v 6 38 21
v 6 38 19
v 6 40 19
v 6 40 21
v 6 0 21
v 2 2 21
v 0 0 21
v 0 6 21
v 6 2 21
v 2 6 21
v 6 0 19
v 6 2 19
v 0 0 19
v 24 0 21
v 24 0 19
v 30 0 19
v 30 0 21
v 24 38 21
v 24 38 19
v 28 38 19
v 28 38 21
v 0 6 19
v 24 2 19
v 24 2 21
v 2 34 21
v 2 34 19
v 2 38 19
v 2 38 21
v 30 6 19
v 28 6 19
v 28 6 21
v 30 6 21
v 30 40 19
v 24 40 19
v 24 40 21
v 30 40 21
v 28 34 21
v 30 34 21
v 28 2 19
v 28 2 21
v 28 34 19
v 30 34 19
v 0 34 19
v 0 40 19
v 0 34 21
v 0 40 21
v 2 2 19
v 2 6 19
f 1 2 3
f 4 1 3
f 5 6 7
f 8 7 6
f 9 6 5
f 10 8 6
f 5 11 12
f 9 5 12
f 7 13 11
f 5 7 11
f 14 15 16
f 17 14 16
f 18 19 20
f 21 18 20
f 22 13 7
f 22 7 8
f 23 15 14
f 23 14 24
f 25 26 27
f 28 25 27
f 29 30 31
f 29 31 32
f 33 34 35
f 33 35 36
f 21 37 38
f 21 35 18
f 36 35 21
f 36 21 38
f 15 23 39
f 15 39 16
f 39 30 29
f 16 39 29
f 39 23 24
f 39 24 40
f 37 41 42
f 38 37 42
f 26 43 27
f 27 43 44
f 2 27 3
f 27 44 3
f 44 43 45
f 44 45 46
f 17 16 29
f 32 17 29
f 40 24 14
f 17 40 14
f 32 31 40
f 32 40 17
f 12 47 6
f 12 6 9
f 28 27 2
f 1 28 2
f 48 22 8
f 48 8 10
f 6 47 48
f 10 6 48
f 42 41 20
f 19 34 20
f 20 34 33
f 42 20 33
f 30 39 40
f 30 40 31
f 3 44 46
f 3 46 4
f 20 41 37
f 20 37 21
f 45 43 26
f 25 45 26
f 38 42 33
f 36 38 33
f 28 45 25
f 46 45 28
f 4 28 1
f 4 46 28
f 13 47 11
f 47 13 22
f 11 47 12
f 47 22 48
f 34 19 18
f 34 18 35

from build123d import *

# Parameters (mm, degrees)
BOX044_W     = 6
BOX044_H     = 2
BOX044_DEPTH = 2
BOX045_W     = 6
BOX045_H     = 2
BOX045_DEPTH = 2
BOX046_W     = 6
BOX046_H     = 2
BOX046_DEPTH = 2
BOX048_W     = 6
BOX048_H     = 2
BOX048_DEPTH = 2
BOX049_W     = 2
BOX049_H     = 6
BOX049_DEPTH = 2
BOX050_W     = 2
BOX050_H     = 6
BOX050_DEPTH = 2
BOX051_W     = 2
BOX051_H     = 6
BOX051_DEPTH = 2
BOX043_W     = 2
BOX043_H     = 6
BOX043_DEPTH = 2


with BuildPart() as cube001:
    # Box044 → Box044 (new body)
    with BuildSketch(Plane.XY.offset(19)):
        with Locations((3, 1)):
            Rectangle(BOX044_W, BOX044_H)
    extrude(amount=BOX044_DEPTH)


with BuildPart() as cube002:
    # Box045 → Box045 (new body)
    with BuildSketch(Plane(origin=(24, 0, 19), x_dir=(1, 0, 0), z_dir=(0, 0, 1))):
        with Locations((3, 1)):
            Rectangle(BOX045_W, BOX045_H)
    extrude(amount=BOX045_DEPTH)


with BuildPart() as cube003:
    # Box046 → Box046 (new body)
    with BuildSketch(Plane(origin=(0, 38, 19), x_dir=(1, 0, 0), z_dir=(0, 0, 1))):
        with Locations((3, 1)):
            Rectangle(BOX046_W, BOX046_H)
    extrude(amount=BOX046_DEPTH)


with BuildPart() as cube005:
    # Box048 → Box048 (new body)
    with BuildSketch(Plane(origin=(24, 38, 19), x_dir=(1, 0, 0), z_dir=(0, 0, 1))):
        with Locations((3, 1)):
            Rectangle(BOX048_W, BOX048_H)
    extrude(amount=BOX048_DEPTH)


with BuildPart() as cube006:
    # Box049 → Box049 (new body)
    with BuildSketch(Plane(origin=(28, 0, 19), x_dir=(1, 0, 0), z_dir=(0, 0, 1))):
        with Locations((1, 3)):
            Rectangle(BOX049_W, BOX049_H)
    extrude(amount=BOX049_DEPTH)


with BuildPart() as cube007:
    # Box050 → Box050 (new body)
    with BuildSketch(Plane(origin=(0, 34, 19), x_dir=(1, 0, 0), z_dir=(0, 0, 1))):
        with Locations((1, 3)):
            Rectangle(BOX050_W, BOX050_H)
    extrude(amount=BOX050_DEPTH)


with BuildPart() as cube008:
    # Box051 → Box051 (new body)
    with BuildSketch(Plane(origin=(28, 34, 19), x_dir=(1, 0, 0), z_dir=(0, 0, 1))):
        with Locations((1, 3)):
            Rectangle(BOX051_W, BOX051_H)
    extrude(amount=BOX051_DEPTH)


with BuildPart() as support:
    # Box043 → Box043 (new body)
    with BuildSketch(Plane.XY.offset(19)):
        with Locations((1, 3)):
            Rectangle(BOX043_W, BOX043_H)
    extrude(amount=BOX043_DEPTH)

    # Fusion012: union Cube001, Cube002, Cube003, Cube005, Cube006, Cube007, Cube008
    add(cube001.part)
    add(cube002.part)
    add(cube003.part)
    add(cube005.part)
    add(cube006.part)
    add(cube007.part)
    add(cube008.part)


solid = support.part
